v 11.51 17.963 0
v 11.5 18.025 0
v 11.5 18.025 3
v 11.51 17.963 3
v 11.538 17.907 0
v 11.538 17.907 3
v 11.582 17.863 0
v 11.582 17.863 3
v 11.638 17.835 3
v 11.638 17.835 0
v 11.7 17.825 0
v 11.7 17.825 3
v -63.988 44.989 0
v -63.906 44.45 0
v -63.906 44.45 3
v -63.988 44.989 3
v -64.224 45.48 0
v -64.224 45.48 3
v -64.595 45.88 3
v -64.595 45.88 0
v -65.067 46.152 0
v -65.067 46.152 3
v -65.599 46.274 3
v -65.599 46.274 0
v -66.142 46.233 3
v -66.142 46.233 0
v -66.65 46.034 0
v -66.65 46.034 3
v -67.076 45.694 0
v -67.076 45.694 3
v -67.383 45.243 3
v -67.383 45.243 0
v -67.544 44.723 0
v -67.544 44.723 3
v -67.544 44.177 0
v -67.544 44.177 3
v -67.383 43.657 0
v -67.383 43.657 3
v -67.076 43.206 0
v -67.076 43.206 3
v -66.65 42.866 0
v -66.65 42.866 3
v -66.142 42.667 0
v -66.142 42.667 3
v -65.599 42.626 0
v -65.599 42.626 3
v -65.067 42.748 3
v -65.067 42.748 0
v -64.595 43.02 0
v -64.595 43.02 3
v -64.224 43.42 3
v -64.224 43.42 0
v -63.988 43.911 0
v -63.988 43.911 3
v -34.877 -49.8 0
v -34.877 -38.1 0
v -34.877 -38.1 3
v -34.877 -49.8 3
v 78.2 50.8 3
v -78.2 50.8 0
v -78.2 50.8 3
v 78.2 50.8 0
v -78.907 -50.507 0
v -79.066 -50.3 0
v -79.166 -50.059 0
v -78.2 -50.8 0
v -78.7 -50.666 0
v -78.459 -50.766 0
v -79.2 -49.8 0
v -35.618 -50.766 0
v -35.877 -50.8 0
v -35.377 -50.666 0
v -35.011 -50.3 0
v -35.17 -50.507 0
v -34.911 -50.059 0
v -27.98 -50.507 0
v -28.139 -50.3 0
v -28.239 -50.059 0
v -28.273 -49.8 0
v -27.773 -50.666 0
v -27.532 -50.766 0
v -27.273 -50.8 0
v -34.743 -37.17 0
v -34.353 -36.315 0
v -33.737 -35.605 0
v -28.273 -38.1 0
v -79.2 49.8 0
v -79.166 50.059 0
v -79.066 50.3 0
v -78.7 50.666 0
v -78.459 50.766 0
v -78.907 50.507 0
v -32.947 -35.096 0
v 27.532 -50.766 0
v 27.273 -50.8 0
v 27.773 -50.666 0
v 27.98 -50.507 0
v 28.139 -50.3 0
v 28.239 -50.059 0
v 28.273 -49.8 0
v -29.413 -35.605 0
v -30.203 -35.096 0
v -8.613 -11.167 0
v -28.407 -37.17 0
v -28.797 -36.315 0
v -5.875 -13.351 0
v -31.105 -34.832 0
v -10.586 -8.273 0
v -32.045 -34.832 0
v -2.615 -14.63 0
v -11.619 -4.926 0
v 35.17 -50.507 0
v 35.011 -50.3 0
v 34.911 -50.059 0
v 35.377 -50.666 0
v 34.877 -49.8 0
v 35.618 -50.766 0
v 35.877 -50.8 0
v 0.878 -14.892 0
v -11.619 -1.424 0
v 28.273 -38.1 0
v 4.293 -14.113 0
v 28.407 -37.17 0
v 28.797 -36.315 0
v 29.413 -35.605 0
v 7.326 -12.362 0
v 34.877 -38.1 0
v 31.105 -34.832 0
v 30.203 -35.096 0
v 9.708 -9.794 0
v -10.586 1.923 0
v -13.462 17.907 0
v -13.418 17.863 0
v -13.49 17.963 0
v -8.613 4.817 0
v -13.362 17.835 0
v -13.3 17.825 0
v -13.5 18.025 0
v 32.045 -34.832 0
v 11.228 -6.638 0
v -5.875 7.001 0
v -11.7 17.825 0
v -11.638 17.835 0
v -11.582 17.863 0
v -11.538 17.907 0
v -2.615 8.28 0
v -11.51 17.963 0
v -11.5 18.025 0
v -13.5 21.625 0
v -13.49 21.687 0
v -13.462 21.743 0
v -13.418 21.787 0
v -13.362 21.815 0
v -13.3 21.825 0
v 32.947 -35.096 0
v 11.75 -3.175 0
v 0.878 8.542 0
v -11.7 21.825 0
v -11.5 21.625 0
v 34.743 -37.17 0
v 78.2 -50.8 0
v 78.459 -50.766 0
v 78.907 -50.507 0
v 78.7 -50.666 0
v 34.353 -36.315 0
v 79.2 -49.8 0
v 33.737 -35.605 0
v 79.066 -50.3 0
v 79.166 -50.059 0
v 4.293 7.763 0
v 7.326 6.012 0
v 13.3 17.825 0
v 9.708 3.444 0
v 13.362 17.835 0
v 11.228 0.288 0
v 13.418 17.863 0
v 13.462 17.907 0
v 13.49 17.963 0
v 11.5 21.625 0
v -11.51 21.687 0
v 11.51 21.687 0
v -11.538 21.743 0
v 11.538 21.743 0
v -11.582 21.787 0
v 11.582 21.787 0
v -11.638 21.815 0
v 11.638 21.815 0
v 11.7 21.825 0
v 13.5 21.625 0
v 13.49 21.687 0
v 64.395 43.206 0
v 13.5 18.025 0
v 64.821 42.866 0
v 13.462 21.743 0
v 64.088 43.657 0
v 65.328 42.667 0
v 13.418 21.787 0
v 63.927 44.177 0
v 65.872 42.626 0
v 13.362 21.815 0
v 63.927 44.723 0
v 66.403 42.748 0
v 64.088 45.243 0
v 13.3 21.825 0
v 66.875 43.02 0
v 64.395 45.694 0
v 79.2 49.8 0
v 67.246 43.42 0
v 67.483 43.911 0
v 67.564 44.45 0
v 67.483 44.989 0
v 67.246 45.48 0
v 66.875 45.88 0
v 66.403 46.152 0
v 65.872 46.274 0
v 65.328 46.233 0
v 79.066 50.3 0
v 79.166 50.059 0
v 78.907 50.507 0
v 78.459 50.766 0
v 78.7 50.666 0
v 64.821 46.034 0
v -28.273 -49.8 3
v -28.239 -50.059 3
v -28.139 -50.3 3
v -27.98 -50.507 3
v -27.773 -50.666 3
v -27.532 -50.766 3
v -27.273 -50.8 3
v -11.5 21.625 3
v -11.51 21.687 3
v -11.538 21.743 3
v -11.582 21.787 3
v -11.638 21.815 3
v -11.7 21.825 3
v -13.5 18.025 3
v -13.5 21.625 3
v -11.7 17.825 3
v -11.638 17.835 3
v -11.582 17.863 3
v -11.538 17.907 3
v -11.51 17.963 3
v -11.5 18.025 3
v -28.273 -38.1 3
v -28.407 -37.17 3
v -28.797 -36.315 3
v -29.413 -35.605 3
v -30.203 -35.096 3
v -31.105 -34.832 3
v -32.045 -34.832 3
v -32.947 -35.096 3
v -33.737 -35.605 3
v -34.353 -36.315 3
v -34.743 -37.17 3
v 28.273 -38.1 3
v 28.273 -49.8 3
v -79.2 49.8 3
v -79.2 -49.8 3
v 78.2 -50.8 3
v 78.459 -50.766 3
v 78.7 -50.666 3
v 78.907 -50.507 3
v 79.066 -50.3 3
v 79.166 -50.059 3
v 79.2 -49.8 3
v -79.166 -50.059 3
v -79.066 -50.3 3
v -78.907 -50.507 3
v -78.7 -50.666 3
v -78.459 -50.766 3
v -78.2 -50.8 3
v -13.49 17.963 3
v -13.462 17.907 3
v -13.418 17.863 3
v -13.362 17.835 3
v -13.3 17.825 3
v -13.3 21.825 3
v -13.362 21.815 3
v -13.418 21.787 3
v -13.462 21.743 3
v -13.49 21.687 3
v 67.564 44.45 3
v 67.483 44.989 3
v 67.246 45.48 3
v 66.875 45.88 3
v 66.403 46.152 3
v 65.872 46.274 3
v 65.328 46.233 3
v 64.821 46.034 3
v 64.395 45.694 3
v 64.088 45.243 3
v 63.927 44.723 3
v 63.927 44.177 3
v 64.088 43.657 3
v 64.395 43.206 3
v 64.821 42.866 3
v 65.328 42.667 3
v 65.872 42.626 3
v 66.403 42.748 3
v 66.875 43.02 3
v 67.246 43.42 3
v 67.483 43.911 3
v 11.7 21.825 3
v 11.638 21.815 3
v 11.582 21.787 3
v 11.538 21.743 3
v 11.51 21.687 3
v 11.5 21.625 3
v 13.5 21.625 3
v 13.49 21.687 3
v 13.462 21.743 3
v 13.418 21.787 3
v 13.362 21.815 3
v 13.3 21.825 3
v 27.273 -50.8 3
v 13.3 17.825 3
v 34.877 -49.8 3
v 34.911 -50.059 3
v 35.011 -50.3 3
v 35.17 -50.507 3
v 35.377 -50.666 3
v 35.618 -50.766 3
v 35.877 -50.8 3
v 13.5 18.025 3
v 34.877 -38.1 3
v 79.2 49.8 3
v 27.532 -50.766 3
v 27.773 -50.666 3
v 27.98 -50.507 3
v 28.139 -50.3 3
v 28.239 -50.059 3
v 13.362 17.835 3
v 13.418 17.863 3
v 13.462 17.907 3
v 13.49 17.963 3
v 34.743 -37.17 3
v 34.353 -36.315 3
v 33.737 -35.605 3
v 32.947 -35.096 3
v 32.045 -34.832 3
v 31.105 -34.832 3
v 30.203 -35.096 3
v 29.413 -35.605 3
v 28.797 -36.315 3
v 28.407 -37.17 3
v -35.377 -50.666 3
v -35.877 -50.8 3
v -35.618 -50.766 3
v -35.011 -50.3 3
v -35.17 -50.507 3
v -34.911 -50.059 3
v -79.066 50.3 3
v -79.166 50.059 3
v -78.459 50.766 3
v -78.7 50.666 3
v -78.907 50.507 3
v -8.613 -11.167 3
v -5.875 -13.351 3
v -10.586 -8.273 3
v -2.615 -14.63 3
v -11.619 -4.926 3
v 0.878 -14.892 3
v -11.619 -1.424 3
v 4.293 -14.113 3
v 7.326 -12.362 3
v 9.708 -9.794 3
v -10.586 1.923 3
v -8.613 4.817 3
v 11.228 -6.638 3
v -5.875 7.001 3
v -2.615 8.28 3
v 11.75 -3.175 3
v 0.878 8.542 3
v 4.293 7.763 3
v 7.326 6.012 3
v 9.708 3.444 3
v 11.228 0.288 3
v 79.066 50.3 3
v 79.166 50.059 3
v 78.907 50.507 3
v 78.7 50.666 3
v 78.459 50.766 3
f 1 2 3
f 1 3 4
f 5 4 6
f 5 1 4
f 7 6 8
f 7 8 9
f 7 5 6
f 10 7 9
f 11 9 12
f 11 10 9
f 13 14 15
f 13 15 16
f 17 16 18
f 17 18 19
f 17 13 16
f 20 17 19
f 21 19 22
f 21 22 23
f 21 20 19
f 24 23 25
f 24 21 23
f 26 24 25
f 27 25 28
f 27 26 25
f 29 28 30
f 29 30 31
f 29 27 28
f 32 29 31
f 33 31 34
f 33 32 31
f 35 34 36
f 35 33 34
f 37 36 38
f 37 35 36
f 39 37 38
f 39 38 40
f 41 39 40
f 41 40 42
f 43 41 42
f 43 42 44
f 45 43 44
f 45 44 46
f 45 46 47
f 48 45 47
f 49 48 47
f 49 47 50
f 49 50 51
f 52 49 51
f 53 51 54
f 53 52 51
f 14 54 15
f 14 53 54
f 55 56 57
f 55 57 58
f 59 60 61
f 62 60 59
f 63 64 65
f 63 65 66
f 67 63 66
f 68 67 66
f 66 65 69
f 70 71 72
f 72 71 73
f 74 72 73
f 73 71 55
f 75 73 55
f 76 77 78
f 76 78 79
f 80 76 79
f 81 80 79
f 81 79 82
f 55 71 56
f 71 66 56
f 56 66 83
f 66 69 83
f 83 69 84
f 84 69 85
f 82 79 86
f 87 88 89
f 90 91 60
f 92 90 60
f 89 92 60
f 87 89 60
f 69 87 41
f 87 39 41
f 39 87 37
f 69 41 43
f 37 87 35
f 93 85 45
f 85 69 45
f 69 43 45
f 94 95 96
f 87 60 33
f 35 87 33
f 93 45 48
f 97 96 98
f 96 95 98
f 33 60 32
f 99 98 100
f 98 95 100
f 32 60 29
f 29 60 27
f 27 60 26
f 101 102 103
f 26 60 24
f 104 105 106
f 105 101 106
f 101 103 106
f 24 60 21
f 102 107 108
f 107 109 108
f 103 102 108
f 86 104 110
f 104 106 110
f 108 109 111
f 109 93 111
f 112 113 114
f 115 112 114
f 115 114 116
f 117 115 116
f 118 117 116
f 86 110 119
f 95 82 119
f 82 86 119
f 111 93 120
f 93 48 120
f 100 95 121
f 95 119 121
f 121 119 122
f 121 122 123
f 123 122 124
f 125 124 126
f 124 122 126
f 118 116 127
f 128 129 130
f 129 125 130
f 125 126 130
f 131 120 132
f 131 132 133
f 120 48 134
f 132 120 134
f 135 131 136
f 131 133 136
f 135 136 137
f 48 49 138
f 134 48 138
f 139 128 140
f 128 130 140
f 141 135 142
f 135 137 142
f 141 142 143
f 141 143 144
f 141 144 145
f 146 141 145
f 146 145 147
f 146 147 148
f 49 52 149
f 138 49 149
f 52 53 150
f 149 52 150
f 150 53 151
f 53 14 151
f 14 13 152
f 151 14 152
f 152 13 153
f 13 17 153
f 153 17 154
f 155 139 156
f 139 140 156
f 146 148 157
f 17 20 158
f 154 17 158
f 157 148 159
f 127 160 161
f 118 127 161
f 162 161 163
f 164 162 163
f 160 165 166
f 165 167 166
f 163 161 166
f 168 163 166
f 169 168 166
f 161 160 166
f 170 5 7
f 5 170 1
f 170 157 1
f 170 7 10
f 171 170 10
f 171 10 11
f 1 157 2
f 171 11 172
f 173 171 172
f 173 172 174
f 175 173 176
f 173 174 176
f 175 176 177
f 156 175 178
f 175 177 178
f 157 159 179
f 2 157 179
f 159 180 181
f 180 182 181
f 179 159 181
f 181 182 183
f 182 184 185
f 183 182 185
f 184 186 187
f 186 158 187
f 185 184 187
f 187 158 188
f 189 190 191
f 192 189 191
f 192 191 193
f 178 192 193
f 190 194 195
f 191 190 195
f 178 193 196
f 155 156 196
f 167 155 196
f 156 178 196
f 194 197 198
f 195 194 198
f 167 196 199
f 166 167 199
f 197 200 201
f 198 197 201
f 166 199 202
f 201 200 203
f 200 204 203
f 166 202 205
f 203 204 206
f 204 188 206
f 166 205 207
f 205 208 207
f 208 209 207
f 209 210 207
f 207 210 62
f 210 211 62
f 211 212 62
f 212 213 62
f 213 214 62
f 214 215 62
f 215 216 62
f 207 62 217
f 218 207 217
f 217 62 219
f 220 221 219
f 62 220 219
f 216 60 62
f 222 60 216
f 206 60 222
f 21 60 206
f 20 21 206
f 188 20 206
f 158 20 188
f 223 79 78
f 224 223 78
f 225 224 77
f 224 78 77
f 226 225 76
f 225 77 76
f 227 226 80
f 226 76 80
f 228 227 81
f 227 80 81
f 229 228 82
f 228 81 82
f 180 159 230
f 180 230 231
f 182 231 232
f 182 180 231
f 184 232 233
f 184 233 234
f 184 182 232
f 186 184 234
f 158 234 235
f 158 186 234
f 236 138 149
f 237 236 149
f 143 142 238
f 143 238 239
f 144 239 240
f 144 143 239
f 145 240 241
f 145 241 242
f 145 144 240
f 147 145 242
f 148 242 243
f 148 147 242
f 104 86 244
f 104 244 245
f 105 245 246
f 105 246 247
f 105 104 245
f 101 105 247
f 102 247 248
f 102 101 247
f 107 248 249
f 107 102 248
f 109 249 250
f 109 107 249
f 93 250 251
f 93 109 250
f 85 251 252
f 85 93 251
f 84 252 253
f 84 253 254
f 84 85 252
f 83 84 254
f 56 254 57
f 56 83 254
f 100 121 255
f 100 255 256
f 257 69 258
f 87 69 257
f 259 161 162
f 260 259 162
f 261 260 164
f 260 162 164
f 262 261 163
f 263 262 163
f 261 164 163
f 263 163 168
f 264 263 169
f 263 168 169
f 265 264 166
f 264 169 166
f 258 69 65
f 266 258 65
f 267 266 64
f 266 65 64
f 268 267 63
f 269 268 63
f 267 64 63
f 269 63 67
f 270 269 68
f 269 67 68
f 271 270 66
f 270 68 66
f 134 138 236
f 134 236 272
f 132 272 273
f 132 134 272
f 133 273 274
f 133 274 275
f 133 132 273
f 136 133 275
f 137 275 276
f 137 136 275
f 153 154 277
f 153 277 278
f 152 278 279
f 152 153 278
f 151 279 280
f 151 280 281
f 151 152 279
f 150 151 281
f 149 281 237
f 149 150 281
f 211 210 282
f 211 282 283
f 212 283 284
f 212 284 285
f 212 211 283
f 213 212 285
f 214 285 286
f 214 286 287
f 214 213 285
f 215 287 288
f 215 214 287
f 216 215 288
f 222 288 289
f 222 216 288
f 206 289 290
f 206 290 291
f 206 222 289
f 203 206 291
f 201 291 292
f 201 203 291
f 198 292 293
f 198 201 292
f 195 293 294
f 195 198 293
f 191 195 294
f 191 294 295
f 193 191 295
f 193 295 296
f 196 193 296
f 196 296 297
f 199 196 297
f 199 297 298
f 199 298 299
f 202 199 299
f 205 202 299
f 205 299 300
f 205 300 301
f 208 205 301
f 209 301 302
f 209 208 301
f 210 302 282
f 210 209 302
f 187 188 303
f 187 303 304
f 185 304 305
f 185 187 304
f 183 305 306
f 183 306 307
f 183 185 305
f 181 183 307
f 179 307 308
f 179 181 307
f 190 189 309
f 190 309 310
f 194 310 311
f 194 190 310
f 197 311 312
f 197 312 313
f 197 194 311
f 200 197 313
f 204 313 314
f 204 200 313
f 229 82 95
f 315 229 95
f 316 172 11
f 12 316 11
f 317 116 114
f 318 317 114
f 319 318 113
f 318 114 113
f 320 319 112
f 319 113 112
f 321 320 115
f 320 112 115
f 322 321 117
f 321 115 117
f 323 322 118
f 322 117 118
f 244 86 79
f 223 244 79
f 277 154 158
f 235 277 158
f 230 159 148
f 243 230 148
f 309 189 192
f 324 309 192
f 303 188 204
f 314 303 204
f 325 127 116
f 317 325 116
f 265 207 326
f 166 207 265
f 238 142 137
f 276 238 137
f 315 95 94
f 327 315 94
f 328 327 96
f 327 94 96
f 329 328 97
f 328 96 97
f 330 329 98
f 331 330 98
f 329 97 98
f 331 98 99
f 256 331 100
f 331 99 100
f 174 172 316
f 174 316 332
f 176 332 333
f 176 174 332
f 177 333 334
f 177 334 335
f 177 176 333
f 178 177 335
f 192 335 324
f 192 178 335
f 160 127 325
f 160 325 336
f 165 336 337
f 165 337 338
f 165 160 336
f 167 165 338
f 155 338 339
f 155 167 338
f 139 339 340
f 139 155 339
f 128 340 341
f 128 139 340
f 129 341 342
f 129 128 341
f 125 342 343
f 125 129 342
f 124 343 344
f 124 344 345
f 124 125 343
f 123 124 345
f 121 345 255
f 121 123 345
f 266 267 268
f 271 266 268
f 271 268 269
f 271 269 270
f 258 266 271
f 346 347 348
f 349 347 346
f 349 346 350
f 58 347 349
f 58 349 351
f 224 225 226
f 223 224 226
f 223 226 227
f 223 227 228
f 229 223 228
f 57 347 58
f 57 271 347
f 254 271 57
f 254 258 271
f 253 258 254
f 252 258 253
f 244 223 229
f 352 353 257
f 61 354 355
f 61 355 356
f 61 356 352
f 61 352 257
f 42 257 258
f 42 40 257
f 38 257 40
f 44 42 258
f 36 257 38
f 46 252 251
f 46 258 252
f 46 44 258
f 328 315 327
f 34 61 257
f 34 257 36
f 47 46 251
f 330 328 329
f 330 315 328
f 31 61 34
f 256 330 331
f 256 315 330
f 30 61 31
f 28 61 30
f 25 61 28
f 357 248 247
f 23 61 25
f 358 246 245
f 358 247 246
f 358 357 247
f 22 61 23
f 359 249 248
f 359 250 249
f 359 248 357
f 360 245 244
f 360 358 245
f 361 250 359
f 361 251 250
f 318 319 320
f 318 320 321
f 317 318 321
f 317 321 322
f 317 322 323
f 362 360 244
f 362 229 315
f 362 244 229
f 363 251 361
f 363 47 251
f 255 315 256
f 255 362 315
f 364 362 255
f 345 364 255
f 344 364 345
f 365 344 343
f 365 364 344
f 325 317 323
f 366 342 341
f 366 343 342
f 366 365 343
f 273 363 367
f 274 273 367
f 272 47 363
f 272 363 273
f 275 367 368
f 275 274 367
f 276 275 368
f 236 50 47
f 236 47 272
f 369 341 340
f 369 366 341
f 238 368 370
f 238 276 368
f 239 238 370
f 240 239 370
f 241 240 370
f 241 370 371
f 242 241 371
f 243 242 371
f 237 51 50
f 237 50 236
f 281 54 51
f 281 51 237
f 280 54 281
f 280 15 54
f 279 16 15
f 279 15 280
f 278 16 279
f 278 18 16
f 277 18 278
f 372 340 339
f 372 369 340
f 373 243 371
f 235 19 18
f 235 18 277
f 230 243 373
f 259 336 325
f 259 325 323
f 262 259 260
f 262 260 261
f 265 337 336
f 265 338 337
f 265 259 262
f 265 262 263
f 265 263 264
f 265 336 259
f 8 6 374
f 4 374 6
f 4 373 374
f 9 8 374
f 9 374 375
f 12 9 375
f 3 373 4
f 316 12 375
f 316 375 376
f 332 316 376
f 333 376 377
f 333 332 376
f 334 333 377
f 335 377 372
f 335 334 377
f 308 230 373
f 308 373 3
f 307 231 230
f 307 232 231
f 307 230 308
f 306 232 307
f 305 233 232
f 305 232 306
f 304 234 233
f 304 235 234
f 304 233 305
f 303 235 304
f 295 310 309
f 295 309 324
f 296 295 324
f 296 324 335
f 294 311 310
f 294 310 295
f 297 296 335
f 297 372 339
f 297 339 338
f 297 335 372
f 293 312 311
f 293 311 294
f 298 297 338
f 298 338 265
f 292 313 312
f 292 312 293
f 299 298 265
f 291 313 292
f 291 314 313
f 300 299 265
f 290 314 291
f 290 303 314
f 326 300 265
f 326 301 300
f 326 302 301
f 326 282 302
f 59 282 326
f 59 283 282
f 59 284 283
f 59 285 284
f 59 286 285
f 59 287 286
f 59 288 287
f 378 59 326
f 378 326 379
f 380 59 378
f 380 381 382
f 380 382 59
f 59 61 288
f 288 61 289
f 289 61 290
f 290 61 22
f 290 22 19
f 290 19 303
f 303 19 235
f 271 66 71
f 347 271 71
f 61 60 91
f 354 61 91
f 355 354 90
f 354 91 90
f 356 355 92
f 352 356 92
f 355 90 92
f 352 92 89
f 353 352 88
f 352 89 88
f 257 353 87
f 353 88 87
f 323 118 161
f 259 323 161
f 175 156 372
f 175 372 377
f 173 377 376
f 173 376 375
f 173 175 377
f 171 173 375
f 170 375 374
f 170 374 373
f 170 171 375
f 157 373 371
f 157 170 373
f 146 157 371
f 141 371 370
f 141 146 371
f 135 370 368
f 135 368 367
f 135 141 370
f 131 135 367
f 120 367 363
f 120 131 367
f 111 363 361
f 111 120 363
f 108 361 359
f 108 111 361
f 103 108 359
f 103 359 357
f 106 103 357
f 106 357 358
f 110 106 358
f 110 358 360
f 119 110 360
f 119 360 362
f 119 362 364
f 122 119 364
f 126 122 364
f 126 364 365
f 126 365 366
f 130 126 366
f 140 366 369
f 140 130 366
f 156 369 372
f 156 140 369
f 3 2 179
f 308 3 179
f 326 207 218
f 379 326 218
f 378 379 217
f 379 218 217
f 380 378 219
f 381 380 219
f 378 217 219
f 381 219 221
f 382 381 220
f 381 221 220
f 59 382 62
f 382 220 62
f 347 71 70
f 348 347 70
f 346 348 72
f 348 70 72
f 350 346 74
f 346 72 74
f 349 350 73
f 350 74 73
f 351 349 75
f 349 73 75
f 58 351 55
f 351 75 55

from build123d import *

# Parameters (mm, degrees)
SKETCH_R   = 11.75
SKETCH_R_2 = 1.8288
PAD_DEPTH  = 3


with BuildPart() as part:
    # Sketch → Pad (new body)
    with BuildSketch(Plane.XY):
        with BuildLine():
            ThreePointArc((-78.2, 50.8), (-78.907107, 50.507107), (-79.2, 49.8))
            Line((-79.2, -49.8), (-79.2, 49.8))
            ThreePointArc((-79.2, -49.8), (-78.907107, -50.507107), (-78.2, -50.8))
            Line((-78.2, -50.8), (-35.877, -50.8))
            ThreePointArc((-35.877, -50.8), (-35.169893, -50.507107), (-34.877, -49.8))
            Line((-34.877, -38.1), (-34.877, -49.8))
            ThreePointArc((-28.273, -38.1), (-31.575, -34.798), (-34.877, -38.1))
            Line((-28.273, -38.1), (-28.273, -49.8))
            ThreePointArc((-28.273, -49.8), (-27.980107, -50.507107), (-27.273, -50.8))
            Line((-27.273, -50.8), (27.273, -50.8))
            ThreePointArc((27.273, -50.8), (27.980107, -50.507107), (28.273, -49.8))
            Line((28.273, -38.1), (28.273, -49.8))
            ThreePointArc((34.877, -38.1), (31.575, -34.798), (28.273, -38.1))
            Line((34.877, -38.1), (34.877, -49.8))
            ThreePointArc((34.877, -49.8), (35.169893, -50.507107), (35.877, -50.8))
            Line((35.877, -50.8), (78.2, -50.8))
            ThreePointArc((78.2, -50.8), (78.907107, -50.507107), (79.2, -49.8))
            Line((79.2, 49.8), (79.2, -49.8))
            ThreePointArc((79.2, 49.8), (78.907107, 50.507107), (78.2, 50.8))
            Line((-78.2, 50.8), (78.2, 50.8))
        make_face()
        with Locations((0, -3.175)):
            Circle(SKETCH_R, mode=Mode.SUBTRACT)
        with Locations((-65.7352, 44.45)):
            Circle(SKETCH_R_2, mode=Mode.SUBTRACT)
        with Locations((65.7352, 44.45)):
            Circle(SKETCH_R_2, mode=Mode.SUBTRACT)
        with BuildLine():
            ThreePointArc((-13.3, 21.825), (-13.441421, 21.766421), (-13.5, 21.625))
            Line((-13.5, 18.025), (-13.5, 21.625))
            ThreePointArc((-13.5, 18.025), (-13.441421, 17.883579), (-13.3, 17.825))
            Line((-11.7, 17.825), (-13.3, 17.825))
            ThreePointArc((-11.7, 17.825), (-11.558579, 17.883579), (-11.5, 18.025))
            Line((-11.5, 21.625), (-11.5, 18.025))
            ThreePointArc((-11.5, 21.625), (-11.558579, 21.766421), (-11.7, 21.825))
            Line((-13.3, 21.825), (-11.7, 21.825))
        make_face(mode=Mode.SUBTRACT)
        with BuildLine():
            ThreePointArc((11.7, 21.825), (11.558579, 21.766421), (11.5, 21.625))
            Line((11.5, 18.025), (11.5, 21.625))
            ThreePointArc((11.5, 18.025), (11.558579, 17.883579), (11.7, 17.825))
            Line((13.3, 17.825), (11.7, 17.825))
            ThreePointArc((13.3, 17.825), (13.441421, 17.883579), (13.5, 18.025))
            Line((13.5, 21.625), (13.5, 18.025))
            ThreePointArc((13.5, 21.625), (13.441421, 21.766421), (13.3, 21.825))
            Line((11.7, 21.825), (13.3, 21.825))
        make_face(mode=Mode.SUBTRACT)
    extrude(amount=PAD_DEPTH)


solid = part.part
